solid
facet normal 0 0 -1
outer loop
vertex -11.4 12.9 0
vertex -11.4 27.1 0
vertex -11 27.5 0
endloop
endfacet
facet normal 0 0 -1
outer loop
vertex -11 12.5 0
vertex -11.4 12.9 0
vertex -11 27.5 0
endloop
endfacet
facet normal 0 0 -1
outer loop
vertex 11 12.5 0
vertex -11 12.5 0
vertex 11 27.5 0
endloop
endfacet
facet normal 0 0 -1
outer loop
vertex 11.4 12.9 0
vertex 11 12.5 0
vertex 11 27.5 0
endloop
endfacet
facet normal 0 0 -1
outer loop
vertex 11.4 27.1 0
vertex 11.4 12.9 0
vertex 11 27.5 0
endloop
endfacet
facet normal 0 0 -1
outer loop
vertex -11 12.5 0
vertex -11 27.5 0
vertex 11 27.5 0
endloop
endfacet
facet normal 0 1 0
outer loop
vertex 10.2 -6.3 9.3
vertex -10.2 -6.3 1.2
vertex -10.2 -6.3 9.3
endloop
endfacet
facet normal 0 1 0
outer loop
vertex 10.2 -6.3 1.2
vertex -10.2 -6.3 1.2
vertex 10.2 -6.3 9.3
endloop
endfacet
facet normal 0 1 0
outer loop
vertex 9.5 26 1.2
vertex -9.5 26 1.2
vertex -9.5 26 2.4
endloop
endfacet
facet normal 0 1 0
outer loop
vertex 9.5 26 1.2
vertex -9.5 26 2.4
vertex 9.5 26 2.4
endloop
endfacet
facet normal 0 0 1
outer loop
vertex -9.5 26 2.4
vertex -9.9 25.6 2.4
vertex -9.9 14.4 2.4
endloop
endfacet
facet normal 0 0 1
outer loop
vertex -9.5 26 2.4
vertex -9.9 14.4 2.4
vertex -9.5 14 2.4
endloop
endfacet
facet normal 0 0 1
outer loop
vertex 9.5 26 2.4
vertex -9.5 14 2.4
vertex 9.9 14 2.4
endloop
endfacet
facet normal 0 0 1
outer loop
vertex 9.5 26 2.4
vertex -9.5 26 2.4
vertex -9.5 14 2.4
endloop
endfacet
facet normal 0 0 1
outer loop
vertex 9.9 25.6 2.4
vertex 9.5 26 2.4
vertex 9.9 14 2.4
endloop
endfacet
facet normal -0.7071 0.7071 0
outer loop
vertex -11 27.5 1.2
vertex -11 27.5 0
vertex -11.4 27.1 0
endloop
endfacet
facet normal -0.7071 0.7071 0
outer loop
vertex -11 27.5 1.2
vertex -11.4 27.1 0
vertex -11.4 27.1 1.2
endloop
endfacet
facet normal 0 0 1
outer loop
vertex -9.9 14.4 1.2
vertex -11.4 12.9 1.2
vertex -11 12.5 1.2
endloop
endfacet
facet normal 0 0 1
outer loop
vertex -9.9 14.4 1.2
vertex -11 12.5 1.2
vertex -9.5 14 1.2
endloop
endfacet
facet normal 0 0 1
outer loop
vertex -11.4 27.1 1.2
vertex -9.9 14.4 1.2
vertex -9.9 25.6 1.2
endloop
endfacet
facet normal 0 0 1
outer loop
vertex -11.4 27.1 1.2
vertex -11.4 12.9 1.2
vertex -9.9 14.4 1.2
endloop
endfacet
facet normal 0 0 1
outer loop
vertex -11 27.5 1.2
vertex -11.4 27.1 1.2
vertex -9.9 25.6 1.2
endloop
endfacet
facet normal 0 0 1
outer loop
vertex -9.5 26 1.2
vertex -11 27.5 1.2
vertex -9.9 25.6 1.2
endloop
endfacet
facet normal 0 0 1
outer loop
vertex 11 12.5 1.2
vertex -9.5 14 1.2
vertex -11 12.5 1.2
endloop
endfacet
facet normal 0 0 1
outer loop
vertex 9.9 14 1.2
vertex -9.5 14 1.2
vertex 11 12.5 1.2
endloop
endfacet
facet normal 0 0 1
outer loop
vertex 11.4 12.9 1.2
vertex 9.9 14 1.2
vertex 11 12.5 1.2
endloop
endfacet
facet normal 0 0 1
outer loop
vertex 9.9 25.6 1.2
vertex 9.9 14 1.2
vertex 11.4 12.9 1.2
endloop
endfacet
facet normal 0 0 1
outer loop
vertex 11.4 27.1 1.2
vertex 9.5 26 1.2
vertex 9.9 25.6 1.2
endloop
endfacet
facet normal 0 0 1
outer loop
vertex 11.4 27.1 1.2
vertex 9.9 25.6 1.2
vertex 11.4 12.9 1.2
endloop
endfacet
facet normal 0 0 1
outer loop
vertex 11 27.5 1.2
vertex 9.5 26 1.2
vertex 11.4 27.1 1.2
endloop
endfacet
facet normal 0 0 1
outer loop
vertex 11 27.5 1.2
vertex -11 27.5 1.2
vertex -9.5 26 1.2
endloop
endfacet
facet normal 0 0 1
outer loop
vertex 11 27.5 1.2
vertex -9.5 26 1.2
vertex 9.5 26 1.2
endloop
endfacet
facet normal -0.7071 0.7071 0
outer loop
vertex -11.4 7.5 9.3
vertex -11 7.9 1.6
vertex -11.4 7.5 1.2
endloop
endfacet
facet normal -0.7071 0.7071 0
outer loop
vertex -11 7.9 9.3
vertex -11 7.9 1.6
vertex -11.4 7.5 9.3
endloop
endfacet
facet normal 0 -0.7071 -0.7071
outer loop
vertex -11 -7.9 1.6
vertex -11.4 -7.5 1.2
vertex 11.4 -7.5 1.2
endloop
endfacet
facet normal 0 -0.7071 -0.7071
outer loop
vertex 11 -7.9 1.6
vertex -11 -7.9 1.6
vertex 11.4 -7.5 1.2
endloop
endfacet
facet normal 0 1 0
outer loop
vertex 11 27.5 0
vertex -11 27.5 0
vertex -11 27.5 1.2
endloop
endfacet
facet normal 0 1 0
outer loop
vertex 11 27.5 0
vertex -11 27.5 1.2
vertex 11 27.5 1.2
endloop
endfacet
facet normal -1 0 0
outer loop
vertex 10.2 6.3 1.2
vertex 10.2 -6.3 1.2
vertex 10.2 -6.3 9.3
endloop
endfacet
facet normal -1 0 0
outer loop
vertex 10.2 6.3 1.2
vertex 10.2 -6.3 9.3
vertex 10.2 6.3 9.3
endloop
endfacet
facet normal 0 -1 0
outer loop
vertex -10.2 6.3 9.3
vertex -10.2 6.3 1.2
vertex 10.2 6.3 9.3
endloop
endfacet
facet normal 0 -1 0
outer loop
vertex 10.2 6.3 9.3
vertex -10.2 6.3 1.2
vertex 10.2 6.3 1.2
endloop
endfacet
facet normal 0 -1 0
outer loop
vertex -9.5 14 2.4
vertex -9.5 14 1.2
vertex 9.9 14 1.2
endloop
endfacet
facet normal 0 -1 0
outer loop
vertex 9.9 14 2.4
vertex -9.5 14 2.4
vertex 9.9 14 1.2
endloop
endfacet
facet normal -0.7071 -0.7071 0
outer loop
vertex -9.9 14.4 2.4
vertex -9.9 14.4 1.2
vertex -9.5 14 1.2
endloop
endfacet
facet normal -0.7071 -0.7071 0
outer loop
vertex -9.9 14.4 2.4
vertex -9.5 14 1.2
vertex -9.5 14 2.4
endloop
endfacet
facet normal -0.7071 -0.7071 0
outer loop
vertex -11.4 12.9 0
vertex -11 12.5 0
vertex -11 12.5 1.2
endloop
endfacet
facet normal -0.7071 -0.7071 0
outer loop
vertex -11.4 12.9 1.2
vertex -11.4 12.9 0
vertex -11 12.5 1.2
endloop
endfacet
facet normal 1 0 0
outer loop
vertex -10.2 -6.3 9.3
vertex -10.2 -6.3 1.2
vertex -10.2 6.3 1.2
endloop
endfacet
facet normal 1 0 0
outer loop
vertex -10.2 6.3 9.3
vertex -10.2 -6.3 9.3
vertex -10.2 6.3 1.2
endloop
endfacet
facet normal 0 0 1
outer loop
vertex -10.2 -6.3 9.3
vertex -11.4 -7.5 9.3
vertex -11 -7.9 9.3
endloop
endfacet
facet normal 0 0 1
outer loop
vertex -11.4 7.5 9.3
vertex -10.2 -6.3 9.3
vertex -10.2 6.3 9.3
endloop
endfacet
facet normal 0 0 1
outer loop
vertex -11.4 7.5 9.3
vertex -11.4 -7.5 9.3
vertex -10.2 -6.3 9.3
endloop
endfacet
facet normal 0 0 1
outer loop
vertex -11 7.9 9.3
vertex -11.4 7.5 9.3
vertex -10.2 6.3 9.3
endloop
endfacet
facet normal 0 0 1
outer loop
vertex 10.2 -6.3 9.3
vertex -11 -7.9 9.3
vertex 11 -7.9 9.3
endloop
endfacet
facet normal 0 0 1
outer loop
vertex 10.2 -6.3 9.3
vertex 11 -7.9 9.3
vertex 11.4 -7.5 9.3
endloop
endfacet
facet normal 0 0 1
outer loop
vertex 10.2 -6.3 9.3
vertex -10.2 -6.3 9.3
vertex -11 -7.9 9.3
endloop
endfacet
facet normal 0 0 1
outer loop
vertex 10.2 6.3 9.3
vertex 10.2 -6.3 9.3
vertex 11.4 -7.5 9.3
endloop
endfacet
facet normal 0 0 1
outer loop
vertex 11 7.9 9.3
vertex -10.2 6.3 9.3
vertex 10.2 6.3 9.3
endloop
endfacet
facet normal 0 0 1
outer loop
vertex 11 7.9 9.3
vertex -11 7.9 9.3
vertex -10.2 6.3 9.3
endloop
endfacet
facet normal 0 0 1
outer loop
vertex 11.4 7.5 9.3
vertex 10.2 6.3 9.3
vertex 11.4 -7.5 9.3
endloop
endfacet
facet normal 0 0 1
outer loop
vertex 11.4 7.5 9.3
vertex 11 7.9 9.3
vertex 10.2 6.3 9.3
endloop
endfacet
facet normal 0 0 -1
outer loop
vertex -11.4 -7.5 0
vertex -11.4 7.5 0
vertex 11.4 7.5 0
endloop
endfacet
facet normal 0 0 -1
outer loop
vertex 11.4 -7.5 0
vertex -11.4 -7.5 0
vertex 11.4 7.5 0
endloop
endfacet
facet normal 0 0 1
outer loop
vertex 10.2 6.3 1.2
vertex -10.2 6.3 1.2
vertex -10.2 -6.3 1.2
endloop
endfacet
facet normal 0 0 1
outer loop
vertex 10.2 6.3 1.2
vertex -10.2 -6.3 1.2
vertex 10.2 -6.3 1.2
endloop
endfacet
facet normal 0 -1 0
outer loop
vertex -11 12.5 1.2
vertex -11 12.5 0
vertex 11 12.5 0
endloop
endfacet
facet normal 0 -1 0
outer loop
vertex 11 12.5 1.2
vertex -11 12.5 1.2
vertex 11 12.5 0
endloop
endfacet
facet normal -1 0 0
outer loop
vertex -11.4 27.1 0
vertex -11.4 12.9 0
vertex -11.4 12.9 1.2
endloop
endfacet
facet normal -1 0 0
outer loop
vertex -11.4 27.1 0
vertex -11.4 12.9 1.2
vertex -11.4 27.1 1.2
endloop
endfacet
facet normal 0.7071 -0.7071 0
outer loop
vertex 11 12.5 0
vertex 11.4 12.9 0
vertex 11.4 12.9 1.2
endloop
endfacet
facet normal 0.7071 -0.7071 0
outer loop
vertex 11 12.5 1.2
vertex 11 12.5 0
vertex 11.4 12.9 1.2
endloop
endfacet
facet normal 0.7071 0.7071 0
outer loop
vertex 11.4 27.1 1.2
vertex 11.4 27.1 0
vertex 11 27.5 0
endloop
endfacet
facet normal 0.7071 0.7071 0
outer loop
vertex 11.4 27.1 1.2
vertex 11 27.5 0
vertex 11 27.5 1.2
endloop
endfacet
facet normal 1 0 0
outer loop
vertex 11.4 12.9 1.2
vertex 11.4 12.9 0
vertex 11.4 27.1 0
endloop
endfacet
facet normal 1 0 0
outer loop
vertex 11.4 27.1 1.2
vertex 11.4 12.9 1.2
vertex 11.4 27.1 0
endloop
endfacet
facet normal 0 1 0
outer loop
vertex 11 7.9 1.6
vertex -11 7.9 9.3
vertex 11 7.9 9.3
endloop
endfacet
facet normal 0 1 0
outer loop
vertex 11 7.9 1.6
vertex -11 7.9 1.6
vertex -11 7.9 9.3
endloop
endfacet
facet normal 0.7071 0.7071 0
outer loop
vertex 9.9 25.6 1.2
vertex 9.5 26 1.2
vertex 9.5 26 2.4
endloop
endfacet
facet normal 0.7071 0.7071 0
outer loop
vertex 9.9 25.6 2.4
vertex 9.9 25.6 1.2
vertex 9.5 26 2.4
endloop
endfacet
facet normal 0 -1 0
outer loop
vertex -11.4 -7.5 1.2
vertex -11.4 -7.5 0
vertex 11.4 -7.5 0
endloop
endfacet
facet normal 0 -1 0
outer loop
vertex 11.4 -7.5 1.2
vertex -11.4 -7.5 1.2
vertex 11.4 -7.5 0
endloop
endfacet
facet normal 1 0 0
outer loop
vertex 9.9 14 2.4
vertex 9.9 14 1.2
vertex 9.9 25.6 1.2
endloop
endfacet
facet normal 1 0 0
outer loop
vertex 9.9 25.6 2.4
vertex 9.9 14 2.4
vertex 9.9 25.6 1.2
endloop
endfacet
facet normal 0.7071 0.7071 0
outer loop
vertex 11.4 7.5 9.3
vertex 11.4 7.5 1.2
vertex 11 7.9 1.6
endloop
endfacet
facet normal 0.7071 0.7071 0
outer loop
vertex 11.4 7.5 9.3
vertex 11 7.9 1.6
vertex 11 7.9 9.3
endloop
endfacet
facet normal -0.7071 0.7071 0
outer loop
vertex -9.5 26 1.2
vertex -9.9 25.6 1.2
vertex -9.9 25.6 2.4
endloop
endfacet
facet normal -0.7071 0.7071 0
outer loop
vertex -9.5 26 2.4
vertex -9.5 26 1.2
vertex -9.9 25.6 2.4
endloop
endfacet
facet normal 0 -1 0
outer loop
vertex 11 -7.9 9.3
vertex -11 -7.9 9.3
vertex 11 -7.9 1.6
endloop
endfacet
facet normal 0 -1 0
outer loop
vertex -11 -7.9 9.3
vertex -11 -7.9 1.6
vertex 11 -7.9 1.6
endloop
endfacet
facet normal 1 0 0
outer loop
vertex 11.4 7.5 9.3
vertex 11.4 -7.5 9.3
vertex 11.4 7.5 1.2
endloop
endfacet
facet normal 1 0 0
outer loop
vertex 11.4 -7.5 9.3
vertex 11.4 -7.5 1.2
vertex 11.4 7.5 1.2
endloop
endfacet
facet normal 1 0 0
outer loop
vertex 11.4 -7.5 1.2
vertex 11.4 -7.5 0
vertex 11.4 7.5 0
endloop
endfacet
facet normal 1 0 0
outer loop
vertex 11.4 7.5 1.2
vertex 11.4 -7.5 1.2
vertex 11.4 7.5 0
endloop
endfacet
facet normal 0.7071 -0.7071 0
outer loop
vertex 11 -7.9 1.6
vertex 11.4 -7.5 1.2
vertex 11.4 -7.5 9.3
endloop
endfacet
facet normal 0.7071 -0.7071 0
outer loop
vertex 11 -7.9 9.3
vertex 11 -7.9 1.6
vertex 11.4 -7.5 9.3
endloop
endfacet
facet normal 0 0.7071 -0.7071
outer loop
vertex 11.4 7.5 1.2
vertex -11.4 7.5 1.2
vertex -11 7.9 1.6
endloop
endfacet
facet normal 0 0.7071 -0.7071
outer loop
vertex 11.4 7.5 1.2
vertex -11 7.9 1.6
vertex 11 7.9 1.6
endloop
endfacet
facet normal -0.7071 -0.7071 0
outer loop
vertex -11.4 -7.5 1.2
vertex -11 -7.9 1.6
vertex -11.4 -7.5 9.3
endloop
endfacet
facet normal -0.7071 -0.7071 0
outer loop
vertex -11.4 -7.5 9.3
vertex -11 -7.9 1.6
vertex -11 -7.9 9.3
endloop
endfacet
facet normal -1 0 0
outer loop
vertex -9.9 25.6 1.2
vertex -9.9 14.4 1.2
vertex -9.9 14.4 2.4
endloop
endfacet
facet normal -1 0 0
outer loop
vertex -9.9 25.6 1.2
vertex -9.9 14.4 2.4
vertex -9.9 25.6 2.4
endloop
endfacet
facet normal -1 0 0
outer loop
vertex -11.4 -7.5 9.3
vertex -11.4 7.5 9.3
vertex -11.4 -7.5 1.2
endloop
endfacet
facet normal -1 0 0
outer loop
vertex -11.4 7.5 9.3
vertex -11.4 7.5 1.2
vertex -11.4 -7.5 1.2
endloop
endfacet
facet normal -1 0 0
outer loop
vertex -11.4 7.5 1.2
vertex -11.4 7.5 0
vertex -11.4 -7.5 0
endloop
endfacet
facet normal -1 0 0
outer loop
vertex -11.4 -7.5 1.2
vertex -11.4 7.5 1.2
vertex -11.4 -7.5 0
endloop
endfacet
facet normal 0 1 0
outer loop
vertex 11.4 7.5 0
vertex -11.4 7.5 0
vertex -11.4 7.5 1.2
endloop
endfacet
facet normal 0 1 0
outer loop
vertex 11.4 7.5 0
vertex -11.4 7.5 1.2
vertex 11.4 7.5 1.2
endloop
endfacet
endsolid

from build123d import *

# Parameters (mm, degrees)
F0_W      = 22.8
F0_H      = 15
F1_DEPTH  = 1.2
F2_W      = 22.8
F2_H      = 0.4
F2_H_2    = 15
F2_W_2    = 20.4
F2_H_3    = 12.6
F3_DEPTH  = 8.1
F4_W      = 19.8
F4_H      = 12
F5_DEPTH  = 1.2
F6_SIZE   = 0.39999
F6_2_SIZE = 0.39999


# Not quite as in the source:
# - a fillet or chamfer is up to 0.001 mm smaller than in the source, because OpenCascade refuses the exact size


with BuildPart() as f1:
    # F0 (on Top) → F1 (new body)
    with BuildSketch(Plane.XY):
        Rectangle(F0_W, F0_H)
    extrude(amount=F1_DEPTH)

    # F2 (on face) → F3 (join)
    with BuildSketch(Plane.XY.offset(1.2)):
        with Locations((0, 7.7)):
            Rectangle(F2_W, F2_H)
        Rectangle(F2_W, F2_H_2)
        Rectangle(F2_W_2, F2_H_3, mode=Mode.SUBTRACT)
        with Locations((0, -7.7)):
            Rectangle(F2_W, F2_H)
    extrude(amount=F3_DEPTH)

    # F6 (size 0.4 in the source; OpenCascade refuses exactly that, so slightly less here)
    f6_edges = [f1.edges().sort_by_distance(p)[0] for p in [
        (0, -7.9, 1.2),
        (11.4, -7.9, 5.25),
        (-11.4, -7.9, 5.25),
        (11.4, 7.9, 5.25),
        (0, 7.9, 1.2),
        (-11.4, 7.9, 5.25),
    ]]
    chamfer(f6_edges, length=F6_SIZE)


with BuildPart() as f1b:
    # F0 (on Top) → F1, piece 2 (new body)
    with BuildSketch(Plane.XY):
        with Locations((0, 20)):
            Rectangle(F0_W, F0_H)
    extrude(amount=F1_DEPTH)

    # F4 (on face) → F5 (join)
    with BuildSketch(Plane.XY.offset(1.2)):
        with Locations((0, 20)):
            Rectangle(F4_W, F4_H)
    extrude(amount=F5_DEPTH)

    # F6#2 (size 0.4 in the source; OpenCascade refuses exactly that, so slightly less here)
    f6_2_edges = [f1b.edges().sort_by_distance(p)[0] for p in [
        (11.4, 12.5, 0.6),
        (-11.4, 12.5, 0.6),
        (-11.4, 27.5, 0.6),
        (-9.9, 26, 1.8),
        (-9.9, 14, 1.8),
        (11.4, 27.5, 0.6),
        (9.9, 26, 1.8),
    ]]
    chamfer(f6_2_edges, length=F6_2_SIZE)


solid = Compound([f1.part, f1b.part])
